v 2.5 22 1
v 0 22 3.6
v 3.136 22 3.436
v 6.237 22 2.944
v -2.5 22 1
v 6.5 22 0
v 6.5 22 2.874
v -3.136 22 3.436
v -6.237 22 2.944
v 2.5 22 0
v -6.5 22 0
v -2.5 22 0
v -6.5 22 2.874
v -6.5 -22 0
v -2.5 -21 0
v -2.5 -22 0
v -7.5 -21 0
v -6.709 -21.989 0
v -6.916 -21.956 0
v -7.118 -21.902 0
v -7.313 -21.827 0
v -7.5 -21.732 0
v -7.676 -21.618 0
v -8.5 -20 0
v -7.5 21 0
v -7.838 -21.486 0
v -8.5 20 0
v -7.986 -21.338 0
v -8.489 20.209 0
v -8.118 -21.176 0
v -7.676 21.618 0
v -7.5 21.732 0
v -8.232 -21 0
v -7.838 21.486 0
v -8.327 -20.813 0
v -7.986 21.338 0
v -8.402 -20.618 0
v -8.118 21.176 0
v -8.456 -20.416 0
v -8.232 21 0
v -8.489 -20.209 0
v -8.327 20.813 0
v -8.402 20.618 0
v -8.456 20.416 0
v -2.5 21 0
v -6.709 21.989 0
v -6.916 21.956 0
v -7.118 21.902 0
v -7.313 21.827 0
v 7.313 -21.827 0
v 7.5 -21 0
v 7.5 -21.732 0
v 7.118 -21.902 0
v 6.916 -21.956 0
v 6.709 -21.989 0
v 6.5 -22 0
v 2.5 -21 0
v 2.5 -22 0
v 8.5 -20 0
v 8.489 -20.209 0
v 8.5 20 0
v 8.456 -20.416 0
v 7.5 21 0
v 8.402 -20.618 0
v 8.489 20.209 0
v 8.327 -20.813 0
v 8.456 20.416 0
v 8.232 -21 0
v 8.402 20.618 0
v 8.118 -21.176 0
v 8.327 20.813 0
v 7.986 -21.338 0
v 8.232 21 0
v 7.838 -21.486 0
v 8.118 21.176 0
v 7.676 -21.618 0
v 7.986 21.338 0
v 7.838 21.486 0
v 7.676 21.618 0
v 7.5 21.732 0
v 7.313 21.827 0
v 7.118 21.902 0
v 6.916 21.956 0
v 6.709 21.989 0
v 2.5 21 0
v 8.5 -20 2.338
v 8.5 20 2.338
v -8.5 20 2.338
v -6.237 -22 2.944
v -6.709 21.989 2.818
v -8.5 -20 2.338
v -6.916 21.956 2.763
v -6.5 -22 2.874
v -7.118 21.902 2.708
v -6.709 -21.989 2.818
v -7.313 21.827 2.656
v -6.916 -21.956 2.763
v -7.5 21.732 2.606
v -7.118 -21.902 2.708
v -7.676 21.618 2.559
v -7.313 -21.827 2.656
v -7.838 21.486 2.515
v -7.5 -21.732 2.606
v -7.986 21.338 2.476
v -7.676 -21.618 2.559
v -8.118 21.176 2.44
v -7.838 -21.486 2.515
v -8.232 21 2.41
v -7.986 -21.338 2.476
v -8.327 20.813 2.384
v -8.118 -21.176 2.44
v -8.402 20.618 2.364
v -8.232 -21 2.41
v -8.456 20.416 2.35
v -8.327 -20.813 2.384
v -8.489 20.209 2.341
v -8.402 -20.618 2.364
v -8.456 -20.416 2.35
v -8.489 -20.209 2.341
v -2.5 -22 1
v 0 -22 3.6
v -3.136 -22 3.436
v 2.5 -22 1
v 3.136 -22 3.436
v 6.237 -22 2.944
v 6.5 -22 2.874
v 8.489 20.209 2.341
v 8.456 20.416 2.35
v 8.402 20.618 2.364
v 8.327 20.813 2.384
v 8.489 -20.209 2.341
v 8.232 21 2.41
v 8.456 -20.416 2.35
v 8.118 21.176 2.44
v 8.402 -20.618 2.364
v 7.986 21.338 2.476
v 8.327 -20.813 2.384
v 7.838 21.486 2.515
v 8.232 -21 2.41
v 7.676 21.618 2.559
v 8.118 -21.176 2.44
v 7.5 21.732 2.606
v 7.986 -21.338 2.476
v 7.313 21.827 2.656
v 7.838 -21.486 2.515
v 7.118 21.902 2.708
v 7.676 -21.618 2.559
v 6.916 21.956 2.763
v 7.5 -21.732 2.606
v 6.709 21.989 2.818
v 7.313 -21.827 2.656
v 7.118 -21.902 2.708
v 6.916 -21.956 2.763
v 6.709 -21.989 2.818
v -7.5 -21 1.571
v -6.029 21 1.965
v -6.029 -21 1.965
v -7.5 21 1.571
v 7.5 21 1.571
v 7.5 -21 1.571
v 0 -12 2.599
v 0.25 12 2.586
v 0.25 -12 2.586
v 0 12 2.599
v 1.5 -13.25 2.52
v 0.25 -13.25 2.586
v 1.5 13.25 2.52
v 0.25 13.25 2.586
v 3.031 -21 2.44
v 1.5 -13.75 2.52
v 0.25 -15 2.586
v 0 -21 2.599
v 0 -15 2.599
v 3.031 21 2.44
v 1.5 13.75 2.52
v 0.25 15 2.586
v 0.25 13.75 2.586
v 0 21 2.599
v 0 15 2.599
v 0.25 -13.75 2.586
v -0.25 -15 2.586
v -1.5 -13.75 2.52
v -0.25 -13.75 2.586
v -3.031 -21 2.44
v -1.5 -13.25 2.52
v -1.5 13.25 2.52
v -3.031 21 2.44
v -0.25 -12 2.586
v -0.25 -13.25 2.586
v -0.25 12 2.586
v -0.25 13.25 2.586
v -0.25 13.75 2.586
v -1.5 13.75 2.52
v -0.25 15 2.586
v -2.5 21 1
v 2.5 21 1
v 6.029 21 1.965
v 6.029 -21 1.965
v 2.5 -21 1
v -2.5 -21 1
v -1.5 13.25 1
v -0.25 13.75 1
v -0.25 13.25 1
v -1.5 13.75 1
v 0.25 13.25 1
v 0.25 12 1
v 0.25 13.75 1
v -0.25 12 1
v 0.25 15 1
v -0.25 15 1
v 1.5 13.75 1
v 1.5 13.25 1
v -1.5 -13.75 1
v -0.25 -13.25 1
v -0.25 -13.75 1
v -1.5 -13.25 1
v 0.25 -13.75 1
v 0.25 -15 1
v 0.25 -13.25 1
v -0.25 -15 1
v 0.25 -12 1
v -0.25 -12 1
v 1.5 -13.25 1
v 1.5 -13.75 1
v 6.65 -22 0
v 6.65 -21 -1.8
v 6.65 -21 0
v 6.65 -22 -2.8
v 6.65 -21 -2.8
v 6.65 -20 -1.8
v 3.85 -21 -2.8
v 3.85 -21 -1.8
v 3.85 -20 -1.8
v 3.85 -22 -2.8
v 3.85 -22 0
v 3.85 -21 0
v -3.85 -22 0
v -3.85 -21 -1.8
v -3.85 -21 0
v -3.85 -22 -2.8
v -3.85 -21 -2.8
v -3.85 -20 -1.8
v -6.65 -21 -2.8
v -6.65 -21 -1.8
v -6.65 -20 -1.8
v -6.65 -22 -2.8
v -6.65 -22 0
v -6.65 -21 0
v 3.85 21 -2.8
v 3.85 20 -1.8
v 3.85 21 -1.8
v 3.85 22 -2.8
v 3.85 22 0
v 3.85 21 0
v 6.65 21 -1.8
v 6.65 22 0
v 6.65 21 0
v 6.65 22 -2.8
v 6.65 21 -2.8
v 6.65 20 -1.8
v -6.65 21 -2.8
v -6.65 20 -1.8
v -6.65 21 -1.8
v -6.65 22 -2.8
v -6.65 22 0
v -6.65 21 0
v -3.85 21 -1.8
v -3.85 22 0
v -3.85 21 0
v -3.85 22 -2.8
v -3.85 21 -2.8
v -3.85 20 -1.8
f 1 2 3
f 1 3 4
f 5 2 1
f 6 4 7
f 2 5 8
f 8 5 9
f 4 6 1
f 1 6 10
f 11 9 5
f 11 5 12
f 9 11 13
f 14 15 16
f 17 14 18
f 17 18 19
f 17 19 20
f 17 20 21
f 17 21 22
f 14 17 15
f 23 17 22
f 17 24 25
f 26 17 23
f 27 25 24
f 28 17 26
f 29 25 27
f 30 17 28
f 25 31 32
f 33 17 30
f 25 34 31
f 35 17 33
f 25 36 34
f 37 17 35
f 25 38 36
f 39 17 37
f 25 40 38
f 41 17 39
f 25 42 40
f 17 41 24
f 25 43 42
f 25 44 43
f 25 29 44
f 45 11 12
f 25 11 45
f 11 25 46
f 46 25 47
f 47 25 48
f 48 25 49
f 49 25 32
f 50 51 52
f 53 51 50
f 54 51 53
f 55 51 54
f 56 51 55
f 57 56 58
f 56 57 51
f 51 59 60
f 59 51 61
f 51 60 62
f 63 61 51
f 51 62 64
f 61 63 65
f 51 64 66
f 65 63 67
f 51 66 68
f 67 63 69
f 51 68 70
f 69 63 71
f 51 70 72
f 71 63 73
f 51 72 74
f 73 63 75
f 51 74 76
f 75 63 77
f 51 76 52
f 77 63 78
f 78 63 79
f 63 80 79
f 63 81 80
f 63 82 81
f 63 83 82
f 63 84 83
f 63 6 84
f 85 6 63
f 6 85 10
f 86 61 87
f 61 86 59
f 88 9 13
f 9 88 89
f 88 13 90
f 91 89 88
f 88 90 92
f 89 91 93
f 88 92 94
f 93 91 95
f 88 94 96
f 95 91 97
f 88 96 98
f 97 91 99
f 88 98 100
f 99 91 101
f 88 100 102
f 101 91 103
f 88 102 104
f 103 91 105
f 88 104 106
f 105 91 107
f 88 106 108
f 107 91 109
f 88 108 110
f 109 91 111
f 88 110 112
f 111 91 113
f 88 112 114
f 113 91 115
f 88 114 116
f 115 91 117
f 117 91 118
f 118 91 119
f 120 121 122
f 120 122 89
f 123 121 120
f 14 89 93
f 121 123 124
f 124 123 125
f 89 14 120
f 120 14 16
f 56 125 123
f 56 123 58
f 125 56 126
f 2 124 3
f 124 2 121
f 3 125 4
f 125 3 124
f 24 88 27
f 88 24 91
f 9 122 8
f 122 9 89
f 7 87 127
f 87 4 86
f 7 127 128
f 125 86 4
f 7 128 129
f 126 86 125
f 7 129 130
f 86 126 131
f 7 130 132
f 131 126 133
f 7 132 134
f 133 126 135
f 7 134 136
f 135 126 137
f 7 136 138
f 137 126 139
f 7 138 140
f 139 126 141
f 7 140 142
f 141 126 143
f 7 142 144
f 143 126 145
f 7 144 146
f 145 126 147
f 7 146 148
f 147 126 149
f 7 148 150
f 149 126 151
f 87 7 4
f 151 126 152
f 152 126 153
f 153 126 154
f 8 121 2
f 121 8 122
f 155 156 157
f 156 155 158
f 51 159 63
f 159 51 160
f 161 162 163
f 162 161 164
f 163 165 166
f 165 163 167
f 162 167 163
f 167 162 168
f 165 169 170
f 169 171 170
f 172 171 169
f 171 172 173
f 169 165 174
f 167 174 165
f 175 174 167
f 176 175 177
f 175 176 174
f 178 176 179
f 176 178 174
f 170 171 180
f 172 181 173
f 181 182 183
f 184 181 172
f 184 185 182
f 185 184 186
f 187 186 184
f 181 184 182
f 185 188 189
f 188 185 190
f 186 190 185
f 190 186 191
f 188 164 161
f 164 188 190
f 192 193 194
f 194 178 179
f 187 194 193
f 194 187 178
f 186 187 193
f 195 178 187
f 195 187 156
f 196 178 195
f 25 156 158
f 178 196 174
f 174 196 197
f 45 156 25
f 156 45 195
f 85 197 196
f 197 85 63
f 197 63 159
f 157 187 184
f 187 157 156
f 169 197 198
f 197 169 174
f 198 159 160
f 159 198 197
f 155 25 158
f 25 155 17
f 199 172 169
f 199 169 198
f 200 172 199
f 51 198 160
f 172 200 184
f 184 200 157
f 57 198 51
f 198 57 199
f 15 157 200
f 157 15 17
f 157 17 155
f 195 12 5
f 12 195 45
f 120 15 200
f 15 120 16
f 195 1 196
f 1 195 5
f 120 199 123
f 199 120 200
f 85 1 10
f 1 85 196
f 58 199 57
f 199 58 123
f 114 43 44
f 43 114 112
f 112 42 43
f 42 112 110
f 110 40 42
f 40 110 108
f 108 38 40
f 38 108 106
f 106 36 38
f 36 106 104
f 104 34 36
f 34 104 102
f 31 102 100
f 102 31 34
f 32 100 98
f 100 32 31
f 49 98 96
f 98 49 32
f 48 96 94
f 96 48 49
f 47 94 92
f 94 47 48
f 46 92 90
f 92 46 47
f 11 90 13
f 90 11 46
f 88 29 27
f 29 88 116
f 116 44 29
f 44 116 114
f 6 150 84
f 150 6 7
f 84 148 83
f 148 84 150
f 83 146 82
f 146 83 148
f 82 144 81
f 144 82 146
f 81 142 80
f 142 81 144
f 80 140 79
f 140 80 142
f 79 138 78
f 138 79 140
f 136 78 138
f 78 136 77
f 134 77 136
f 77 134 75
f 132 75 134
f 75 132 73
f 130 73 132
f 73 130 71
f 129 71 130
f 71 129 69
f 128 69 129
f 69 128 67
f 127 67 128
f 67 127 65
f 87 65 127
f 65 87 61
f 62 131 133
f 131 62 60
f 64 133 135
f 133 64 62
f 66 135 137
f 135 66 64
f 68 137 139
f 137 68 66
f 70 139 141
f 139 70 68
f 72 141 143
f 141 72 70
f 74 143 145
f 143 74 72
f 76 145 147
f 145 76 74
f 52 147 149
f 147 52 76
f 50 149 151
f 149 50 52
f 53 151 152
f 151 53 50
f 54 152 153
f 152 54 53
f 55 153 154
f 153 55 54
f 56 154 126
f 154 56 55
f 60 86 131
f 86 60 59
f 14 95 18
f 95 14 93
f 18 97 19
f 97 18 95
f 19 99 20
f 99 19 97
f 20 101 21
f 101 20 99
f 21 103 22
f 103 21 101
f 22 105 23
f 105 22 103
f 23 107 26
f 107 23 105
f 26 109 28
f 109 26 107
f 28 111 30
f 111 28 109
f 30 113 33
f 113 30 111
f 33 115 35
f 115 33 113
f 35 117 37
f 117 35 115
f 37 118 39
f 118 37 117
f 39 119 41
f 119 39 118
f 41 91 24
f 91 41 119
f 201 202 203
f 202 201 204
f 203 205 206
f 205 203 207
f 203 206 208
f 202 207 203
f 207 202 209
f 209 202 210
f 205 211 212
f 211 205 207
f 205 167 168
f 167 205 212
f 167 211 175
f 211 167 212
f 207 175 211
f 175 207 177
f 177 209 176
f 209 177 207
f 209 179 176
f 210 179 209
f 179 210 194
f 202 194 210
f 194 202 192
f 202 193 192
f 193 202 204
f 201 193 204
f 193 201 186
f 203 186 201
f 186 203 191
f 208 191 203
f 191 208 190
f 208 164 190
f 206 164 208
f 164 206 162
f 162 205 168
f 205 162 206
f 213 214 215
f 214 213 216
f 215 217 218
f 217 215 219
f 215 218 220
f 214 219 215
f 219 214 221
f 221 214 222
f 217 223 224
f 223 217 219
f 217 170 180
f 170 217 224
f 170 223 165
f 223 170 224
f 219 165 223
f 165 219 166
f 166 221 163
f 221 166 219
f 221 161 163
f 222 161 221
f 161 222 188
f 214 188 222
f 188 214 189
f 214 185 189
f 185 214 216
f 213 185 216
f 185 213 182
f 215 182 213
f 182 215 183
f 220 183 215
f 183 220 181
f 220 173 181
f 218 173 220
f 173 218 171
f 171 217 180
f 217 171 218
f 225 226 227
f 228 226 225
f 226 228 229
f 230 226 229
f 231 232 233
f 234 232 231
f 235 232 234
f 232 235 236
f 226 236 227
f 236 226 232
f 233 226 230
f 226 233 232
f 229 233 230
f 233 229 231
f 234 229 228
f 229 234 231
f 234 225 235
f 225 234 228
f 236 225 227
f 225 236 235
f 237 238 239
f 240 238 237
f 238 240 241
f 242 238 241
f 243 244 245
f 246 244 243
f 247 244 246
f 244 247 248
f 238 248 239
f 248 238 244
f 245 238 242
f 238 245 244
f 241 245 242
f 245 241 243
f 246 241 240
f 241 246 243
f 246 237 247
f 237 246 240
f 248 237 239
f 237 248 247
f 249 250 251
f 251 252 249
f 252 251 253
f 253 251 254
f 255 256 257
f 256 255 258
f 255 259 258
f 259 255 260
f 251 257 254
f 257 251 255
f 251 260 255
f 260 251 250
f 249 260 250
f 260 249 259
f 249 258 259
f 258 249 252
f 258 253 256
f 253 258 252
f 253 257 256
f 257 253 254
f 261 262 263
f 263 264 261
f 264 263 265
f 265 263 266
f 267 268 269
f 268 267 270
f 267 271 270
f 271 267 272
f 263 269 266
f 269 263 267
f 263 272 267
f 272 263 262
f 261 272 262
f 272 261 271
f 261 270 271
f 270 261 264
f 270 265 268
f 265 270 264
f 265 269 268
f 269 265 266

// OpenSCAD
new_ihc_tanget($fn=60);

module smooth(r) offset(r=r) offset(r=-r) children();


module baseline5050() difference() {
    linear_extrude(9) smooth(5) square([50,50], true);
    translate([0,0,1.2]) linear_extrude(9) smooth(2.5) square([45.5,45.5], true);
    linear_extrude(6) square([46.5,6], true);
    linear_extrude(6) square([6,46.5], true);
    
    large_radius=51/2;
    small_radius=44/2;
    radius_delta=large_radius-small_radius;
    linear_extrude(9)  difference() {
        polygon([
            for(a=[0:5:360]) [
                (large_radius+(sin((a-45)*2)*radius_delta))*cos(a), 
                (large_radius+(cos(a*2)*radius_delta))*sin(a)
            ]
        ]);
    }
}


module front_profile() smooth(2) square([45,45], true);


module front_profile_knobs() {
    front_profile();
    square([46.5,6], true);
}


module back_profile()  {
    large_radius=50.5/2;
    small_radius=43/2;
    radius_delta=large_radius-small_radius;
    difference() {
        polygon([
            for(a=[0:5:360]) [
                (large_radius+(sin((a-45)*2)*radius_delta))*cos(a), 
                (large_radius+(cos(a*2)*radius_delta))*sin(a)
            ]
        ]);
    }
}


module tanget_tap_profile(l=2.8) polygon([[0,0],[0,1],[1,2],[1,1],[l,1],[l,0]]);

module ihc_tangent_profile() {
    inner_curvature_radius = 30;
    outer_tanget_width = 17;
    tangent_height = 3.6;

    intersection() {
        translate([0,-inner_curvature_radius+tangent_height]) circle(r=inner_curvature_radius);
        translate([-outer_tanget_width/2,0]) square([outer_tanget_width, tangent_height]);
    }
}


module new_ihc_tanget() {
    tangent_length=44;
    tap_length=2.8;
    wall_thickness = 1;
    outer_tanget_width = 17;

    // Body
    difference() {
        translate([0,tangent_length/2]) rotate([90,0,0]) linear_extrude(tangent_length) ihc_tangent_profile();
        translate([0,tangent_length/2-wall_thickness]) rotate([90,0,0]) linear_extrude(tangent_length-2*wall_thickness) offset(delta=-wall_thickness) ihc_tangent_profile();
        linear_extrude(1) square([15,tangent_length-2*wall_thickness], true);
        linear_extrude(1) square([5,tangent_length], true);
        
        // Fillets
        linear_extrude(10) difference() {
            square([outer_tanget_width,tangent_length], true);
            smooth(r=2) square([outer_tanget_width,tangent_length], true);
        }
    }
    
    // Button stands (crosses)
    translate([0,0,1]) for (i=[1,-1]) translate([0, 27/2*i]) linear_extrude(2) {
        square([0.5, 3], true);
        square([3, 0.5], true);
    }
    
    // Taps
    translate([2.8/2+10.5/2,-tangent_length/2,-tap_length]) rotate([0,-90,0]) linear_extrude(2.8) tanget_tap_profile(tap_length);
    translate([2.8/2-10.5/2,-tangent_length/2,-tap_length]) rotate([0,-90,0]) linear_extrude(2.8) tanget_tap_profile(tap_length);
    translate([-2.8/2+10.5/2,tangent_length/2,-tap_length]) rotate([0,-90,180]) linear_extrude(2.8) tanget_tap_profile(tap_length);
    translate([-2.8/2-10.5/2,tangent_length/2,-tap_length]) rotate([0,-90,180]) linear_extrude(2.8) tanget_tap_profile(tap_length);
}



module slim_cover_bar() {
    
    tangent_length=44;
    tap_length=2.8;
    wall_thickness=1.4;
    
    // Body
    difference() {
        linear_extrude(3.2) square([10,tangent_length], true);
        linear_extrude(3.2-wall_thickness) square([10-2*wall_thickness,tangent_length-2*wall_thickness], true);
        linear_extrude(wall_thickness) square([5,tangent_length], true);
    }

    // Taps
    translate([10/2-wall_thickness, -tangent_length/2+2,-tap_length]) rotate([0,-90,180]) linear_extrude(wall_thickness) tanget_tap_profile(tap_length);
    translate([-10/2, -tangent_length/2+2,-tap_length]) rotate([0,-90,180]) linear_extrude(wall_thickness) tanget_tap_profile(tap_length);
    translate([-10/2+wall_thickness,  tangent_length/2-2,-tap_length]) rotate([0,-90,0]) linear_extrude(wall_thickness) tanget_tap_profile(tap_length);
    translate([10/2,  tangent_length/2-2,-tap_length]) rotate([0,-90,0]) linear_extrude(wall_thickness) tanget_tap_profile(tap_length);
}
